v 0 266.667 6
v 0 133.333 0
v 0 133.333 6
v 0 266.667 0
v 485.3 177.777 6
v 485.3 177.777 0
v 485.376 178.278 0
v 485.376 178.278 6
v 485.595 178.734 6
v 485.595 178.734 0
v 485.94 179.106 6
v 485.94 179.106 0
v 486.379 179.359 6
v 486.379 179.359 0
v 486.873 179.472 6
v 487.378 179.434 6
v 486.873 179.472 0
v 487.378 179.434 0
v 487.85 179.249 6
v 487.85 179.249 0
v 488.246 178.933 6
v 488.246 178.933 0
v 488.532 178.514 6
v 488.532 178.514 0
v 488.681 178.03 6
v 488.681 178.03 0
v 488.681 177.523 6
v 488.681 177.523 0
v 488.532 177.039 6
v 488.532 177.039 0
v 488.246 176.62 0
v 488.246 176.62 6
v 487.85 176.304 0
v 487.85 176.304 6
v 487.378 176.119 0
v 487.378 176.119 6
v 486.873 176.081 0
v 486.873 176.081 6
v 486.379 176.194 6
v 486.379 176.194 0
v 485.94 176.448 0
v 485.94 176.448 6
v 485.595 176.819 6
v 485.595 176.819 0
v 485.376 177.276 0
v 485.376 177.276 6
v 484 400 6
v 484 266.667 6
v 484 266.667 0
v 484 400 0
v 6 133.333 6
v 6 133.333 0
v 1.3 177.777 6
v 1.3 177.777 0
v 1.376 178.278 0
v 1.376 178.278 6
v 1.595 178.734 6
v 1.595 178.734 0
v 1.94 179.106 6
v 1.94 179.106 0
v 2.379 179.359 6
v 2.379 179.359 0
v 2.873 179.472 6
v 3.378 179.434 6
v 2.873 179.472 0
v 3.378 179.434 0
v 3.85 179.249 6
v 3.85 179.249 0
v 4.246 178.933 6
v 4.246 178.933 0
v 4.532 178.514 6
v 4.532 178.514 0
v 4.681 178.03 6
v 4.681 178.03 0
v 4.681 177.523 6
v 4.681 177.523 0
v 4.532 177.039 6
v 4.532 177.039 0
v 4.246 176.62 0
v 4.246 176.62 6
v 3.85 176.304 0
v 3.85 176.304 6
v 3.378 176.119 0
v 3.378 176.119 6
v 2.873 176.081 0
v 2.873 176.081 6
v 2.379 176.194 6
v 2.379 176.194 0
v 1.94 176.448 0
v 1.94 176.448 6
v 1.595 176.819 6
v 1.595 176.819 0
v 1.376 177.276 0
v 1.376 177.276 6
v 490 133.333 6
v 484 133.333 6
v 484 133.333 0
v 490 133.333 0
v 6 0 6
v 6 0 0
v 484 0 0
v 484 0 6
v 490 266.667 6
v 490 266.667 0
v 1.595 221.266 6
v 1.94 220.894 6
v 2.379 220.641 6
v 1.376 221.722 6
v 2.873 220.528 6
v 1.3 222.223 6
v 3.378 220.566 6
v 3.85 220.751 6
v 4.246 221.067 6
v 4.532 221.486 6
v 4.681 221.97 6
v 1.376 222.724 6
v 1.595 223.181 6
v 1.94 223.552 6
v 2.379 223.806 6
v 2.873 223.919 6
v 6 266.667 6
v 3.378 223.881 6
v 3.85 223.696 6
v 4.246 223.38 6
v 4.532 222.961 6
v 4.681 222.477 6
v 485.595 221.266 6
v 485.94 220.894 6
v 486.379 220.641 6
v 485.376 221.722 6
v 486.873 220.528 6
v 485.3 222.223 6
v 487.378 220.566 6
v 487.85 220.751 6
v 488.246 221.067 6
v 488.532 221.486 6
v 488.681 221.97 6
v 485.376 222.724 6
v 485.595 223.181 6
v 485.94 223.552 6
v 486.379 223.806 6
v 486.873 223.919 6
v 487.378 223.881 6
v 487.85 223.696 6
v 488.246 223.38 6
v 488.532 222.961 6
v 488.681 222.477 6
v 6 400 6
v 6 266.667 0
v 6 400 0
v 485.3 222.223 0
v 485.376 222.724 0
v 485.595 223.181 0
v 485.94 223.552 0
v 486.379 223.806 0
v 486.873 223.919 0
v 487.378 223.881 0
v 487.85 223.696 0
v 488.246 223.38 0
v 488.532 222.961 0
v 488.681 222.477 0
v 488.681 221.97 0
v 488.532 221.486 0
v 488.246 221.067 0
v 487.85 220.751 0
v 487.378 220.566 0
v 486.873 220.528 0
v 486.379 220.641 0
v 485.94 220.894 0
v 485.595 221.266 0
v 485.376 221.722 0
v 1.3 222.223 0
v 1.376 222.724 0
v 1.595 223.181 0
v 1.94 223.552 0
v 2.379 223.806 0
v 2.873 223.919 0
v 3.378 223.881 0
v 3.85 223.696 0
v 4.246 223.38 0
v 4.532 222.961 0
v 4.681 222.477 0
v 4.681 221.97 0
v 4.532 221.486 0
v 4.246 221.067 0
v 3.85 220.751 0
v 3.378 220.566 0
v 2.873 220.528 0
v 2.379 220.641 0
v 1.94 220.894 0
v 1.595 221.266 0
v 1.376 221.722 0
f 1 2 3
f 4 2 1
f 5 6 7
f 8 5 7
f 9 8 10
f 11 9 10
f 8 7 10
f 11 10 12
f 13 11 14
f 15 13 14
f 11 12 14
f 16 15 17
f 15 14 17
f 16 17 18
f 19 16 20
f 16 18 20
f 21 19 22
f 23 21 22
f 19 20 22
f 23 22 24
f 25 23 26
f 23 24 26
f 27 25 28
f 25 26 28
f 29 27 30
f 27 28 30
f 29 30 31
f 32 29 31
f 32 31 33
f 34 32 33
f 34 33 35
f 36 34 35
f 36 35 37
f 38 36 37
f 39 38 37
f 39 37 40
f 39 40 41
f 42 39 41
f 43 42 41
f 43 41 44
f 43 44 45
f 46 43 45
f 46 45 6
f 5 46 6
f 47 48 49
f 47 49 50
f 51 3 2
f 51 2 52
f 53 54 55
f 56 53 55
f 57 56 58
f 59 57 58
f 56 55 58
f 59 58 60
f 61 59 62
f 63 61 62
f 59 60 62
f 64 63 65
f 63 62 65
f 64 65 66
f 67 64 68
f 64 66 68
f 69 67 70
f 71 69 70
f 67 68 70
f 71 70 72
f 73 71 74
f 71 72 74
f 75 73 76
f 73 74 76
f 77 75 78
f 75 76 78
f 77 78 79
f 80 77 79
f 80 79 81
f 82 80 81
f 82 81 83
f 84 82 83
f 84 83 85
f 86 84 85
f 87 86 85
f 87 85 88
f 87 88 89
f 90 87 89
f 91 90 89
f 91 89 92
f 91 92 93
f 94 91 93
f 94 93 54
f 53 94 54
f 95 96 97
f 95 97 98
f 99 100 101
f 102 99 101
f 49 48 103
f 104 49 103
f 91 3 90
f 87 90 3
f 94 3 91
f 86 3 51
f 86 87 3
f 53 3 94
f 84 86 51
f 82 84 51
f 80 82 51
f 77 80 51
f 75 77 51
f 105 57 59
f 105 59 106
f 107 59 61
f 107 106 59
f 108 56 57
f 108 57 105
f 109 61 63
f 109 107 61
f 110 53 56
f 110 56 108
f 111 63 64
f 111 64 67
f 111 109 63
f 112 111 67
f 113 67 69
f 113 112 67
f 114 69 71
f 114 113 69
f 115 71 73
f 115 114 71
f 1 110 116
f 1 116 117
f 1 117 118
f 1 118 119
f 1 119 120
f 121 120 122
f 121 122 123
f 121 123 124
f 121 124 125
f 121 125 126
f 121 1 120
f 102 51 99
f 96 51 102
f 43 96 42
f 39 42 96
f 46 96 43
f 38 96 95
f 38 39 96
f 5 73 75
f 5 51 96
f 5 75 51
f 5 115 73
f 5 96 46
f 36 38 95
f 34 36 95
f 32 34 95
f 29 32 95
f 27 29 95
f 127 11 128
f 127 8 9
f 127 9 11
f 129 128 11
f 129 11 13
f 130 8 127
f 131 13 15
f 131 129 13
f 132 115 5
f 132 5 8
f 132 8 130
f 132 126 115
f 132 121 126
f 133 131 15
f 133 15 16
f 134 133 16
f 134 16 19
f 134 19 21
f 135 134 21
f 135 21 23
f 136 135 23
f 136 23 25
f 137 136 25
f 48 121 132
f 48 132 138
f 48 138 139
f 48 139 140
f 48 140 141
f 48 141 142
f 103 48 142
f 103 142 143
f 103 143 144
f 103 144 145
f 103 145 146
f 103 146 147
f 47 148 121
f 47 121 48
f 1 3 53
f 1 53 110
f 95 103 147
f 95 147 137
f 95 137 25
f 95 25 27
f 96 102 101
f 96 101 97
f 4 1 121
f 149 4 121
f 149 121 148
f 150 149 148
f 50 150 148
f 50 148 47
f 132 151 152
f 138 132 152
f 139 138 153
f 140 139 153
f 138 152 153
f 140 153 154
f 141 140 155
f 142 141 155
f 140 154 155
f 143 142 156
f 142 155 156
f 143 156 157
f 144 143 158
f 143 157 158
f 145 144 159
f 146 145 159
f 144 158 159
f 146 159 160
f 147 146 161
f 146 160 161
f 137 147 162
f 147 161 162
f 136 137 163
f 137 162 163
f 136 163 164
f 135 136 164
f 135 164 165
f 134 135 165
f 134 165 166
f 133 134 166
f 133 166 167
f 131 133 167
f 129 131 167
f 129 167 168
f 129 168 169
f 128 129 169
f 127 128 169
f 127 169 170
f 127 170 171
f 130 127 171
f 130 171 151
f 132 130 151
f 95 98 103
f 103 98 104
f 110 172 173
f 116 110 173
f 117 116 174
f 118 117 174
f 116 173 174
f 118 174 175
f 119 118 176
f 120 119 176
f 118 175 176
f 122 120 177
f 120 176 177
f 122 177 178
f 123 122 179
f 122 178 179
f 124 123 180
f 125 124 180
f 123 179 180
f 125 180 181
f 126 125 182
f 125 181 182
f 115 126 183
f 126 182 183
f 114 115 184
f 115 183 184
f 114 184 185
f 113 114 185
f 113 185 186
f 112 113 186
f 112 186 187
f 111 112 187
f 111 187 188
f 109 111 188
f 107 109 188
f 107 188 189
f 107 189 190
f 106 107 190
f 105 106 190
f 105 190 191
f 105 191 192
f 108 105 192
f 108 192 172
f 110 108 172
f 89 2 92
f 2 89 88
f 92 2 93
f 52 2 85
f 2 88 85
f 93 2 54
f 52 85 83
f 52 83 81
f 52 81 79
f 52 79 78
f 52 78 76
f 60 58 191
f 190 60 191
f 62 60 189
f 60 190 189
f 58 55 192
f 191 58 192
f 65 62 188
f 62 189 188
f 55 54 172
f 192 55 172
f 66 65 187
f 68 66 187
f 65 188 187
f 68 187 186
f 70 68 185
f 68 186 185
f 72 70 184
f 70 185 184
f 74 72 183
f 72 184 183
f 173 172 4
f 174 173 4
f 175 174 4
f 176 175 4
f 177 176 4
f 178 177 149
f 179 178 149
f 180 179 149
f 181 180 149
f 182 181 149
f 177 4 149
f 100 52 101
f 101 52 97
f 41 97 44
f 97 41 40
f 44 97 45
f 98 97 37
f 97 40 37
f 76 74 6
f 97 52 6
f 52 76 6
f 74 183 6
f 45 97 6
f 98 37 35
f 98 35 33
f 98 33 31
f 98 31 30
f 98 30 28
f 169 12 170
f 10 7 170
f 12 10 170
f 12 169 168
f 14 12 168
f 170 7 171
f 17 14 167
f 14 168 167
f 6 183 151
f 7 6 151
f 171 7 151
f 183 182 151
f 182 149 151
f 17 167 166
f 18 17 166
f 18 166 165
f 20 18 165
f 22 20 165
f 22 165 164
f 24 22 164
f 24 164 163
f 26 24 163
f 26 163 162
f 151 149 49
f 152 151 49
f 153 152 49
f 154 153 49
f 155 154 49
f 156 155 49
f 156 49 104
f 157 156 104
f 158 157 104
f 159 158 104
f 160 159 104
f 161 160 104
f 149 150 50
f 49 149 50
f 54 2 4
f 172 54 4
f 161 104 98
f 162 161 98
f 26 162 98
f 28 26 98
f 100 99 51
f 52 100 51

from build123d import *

# Parameters (mm, degrees)
SKETCH1_W            = 490
SKETCH1_H            = 400
BOSS_EXTRUDE1_DEPTH  = 6
SKETCH2_W            = 6
SKETCH2_H            = 133.333333333
CUT_EXTRUDE1_DEPTH   = 12
M3_CLEARANCE_HOLE1_D = 3.4


with BuildPart() as part:
    # Sketch1 → Boss-Extrude1 (new body)
    with BuildSketch(Plane.XY):
        with Locations((245, 200)):
            Rectangle(SKETCH1_W, SKETCH1_H)
    extrude(amount=BOSS_EXTRUDE1_DEPTH)

    # Sketch2 → Cut-Extrude1 (cut)
    with BuildSketch(Plane.XY.offset(6)):
        with Locations((487, 333.333333334)):
            Rectangle(SKETCH2_W, SKETCH2_H)
        with Locations((3, 333.333333334)):
            Rectangle(SKETCH2_W, SKETCH2_H)
        with Locations((3, 66.666666667)):
            Rectangle(SKETCH2_W, SKETCH2_H)
        with Locations((487, 66.666666667)):
            Rectangle(SKETCH2_W, SKETCH2_H)
    extrude(amount=-CUT_EXTRUDE1_DEPTH, mode=Mode.SUBTRACT)

    # M3 Clearance Hole1 (through all)
    with Locations(Plane.XY.offset(6)):
        with Locations((3, 222.223333333), (3, 177.776666667), (487, 222.223333333), (487, 177.776666667)):
            Hole(M3_CLEARANCE_HOLE1_D / 2)


solid = part.part
